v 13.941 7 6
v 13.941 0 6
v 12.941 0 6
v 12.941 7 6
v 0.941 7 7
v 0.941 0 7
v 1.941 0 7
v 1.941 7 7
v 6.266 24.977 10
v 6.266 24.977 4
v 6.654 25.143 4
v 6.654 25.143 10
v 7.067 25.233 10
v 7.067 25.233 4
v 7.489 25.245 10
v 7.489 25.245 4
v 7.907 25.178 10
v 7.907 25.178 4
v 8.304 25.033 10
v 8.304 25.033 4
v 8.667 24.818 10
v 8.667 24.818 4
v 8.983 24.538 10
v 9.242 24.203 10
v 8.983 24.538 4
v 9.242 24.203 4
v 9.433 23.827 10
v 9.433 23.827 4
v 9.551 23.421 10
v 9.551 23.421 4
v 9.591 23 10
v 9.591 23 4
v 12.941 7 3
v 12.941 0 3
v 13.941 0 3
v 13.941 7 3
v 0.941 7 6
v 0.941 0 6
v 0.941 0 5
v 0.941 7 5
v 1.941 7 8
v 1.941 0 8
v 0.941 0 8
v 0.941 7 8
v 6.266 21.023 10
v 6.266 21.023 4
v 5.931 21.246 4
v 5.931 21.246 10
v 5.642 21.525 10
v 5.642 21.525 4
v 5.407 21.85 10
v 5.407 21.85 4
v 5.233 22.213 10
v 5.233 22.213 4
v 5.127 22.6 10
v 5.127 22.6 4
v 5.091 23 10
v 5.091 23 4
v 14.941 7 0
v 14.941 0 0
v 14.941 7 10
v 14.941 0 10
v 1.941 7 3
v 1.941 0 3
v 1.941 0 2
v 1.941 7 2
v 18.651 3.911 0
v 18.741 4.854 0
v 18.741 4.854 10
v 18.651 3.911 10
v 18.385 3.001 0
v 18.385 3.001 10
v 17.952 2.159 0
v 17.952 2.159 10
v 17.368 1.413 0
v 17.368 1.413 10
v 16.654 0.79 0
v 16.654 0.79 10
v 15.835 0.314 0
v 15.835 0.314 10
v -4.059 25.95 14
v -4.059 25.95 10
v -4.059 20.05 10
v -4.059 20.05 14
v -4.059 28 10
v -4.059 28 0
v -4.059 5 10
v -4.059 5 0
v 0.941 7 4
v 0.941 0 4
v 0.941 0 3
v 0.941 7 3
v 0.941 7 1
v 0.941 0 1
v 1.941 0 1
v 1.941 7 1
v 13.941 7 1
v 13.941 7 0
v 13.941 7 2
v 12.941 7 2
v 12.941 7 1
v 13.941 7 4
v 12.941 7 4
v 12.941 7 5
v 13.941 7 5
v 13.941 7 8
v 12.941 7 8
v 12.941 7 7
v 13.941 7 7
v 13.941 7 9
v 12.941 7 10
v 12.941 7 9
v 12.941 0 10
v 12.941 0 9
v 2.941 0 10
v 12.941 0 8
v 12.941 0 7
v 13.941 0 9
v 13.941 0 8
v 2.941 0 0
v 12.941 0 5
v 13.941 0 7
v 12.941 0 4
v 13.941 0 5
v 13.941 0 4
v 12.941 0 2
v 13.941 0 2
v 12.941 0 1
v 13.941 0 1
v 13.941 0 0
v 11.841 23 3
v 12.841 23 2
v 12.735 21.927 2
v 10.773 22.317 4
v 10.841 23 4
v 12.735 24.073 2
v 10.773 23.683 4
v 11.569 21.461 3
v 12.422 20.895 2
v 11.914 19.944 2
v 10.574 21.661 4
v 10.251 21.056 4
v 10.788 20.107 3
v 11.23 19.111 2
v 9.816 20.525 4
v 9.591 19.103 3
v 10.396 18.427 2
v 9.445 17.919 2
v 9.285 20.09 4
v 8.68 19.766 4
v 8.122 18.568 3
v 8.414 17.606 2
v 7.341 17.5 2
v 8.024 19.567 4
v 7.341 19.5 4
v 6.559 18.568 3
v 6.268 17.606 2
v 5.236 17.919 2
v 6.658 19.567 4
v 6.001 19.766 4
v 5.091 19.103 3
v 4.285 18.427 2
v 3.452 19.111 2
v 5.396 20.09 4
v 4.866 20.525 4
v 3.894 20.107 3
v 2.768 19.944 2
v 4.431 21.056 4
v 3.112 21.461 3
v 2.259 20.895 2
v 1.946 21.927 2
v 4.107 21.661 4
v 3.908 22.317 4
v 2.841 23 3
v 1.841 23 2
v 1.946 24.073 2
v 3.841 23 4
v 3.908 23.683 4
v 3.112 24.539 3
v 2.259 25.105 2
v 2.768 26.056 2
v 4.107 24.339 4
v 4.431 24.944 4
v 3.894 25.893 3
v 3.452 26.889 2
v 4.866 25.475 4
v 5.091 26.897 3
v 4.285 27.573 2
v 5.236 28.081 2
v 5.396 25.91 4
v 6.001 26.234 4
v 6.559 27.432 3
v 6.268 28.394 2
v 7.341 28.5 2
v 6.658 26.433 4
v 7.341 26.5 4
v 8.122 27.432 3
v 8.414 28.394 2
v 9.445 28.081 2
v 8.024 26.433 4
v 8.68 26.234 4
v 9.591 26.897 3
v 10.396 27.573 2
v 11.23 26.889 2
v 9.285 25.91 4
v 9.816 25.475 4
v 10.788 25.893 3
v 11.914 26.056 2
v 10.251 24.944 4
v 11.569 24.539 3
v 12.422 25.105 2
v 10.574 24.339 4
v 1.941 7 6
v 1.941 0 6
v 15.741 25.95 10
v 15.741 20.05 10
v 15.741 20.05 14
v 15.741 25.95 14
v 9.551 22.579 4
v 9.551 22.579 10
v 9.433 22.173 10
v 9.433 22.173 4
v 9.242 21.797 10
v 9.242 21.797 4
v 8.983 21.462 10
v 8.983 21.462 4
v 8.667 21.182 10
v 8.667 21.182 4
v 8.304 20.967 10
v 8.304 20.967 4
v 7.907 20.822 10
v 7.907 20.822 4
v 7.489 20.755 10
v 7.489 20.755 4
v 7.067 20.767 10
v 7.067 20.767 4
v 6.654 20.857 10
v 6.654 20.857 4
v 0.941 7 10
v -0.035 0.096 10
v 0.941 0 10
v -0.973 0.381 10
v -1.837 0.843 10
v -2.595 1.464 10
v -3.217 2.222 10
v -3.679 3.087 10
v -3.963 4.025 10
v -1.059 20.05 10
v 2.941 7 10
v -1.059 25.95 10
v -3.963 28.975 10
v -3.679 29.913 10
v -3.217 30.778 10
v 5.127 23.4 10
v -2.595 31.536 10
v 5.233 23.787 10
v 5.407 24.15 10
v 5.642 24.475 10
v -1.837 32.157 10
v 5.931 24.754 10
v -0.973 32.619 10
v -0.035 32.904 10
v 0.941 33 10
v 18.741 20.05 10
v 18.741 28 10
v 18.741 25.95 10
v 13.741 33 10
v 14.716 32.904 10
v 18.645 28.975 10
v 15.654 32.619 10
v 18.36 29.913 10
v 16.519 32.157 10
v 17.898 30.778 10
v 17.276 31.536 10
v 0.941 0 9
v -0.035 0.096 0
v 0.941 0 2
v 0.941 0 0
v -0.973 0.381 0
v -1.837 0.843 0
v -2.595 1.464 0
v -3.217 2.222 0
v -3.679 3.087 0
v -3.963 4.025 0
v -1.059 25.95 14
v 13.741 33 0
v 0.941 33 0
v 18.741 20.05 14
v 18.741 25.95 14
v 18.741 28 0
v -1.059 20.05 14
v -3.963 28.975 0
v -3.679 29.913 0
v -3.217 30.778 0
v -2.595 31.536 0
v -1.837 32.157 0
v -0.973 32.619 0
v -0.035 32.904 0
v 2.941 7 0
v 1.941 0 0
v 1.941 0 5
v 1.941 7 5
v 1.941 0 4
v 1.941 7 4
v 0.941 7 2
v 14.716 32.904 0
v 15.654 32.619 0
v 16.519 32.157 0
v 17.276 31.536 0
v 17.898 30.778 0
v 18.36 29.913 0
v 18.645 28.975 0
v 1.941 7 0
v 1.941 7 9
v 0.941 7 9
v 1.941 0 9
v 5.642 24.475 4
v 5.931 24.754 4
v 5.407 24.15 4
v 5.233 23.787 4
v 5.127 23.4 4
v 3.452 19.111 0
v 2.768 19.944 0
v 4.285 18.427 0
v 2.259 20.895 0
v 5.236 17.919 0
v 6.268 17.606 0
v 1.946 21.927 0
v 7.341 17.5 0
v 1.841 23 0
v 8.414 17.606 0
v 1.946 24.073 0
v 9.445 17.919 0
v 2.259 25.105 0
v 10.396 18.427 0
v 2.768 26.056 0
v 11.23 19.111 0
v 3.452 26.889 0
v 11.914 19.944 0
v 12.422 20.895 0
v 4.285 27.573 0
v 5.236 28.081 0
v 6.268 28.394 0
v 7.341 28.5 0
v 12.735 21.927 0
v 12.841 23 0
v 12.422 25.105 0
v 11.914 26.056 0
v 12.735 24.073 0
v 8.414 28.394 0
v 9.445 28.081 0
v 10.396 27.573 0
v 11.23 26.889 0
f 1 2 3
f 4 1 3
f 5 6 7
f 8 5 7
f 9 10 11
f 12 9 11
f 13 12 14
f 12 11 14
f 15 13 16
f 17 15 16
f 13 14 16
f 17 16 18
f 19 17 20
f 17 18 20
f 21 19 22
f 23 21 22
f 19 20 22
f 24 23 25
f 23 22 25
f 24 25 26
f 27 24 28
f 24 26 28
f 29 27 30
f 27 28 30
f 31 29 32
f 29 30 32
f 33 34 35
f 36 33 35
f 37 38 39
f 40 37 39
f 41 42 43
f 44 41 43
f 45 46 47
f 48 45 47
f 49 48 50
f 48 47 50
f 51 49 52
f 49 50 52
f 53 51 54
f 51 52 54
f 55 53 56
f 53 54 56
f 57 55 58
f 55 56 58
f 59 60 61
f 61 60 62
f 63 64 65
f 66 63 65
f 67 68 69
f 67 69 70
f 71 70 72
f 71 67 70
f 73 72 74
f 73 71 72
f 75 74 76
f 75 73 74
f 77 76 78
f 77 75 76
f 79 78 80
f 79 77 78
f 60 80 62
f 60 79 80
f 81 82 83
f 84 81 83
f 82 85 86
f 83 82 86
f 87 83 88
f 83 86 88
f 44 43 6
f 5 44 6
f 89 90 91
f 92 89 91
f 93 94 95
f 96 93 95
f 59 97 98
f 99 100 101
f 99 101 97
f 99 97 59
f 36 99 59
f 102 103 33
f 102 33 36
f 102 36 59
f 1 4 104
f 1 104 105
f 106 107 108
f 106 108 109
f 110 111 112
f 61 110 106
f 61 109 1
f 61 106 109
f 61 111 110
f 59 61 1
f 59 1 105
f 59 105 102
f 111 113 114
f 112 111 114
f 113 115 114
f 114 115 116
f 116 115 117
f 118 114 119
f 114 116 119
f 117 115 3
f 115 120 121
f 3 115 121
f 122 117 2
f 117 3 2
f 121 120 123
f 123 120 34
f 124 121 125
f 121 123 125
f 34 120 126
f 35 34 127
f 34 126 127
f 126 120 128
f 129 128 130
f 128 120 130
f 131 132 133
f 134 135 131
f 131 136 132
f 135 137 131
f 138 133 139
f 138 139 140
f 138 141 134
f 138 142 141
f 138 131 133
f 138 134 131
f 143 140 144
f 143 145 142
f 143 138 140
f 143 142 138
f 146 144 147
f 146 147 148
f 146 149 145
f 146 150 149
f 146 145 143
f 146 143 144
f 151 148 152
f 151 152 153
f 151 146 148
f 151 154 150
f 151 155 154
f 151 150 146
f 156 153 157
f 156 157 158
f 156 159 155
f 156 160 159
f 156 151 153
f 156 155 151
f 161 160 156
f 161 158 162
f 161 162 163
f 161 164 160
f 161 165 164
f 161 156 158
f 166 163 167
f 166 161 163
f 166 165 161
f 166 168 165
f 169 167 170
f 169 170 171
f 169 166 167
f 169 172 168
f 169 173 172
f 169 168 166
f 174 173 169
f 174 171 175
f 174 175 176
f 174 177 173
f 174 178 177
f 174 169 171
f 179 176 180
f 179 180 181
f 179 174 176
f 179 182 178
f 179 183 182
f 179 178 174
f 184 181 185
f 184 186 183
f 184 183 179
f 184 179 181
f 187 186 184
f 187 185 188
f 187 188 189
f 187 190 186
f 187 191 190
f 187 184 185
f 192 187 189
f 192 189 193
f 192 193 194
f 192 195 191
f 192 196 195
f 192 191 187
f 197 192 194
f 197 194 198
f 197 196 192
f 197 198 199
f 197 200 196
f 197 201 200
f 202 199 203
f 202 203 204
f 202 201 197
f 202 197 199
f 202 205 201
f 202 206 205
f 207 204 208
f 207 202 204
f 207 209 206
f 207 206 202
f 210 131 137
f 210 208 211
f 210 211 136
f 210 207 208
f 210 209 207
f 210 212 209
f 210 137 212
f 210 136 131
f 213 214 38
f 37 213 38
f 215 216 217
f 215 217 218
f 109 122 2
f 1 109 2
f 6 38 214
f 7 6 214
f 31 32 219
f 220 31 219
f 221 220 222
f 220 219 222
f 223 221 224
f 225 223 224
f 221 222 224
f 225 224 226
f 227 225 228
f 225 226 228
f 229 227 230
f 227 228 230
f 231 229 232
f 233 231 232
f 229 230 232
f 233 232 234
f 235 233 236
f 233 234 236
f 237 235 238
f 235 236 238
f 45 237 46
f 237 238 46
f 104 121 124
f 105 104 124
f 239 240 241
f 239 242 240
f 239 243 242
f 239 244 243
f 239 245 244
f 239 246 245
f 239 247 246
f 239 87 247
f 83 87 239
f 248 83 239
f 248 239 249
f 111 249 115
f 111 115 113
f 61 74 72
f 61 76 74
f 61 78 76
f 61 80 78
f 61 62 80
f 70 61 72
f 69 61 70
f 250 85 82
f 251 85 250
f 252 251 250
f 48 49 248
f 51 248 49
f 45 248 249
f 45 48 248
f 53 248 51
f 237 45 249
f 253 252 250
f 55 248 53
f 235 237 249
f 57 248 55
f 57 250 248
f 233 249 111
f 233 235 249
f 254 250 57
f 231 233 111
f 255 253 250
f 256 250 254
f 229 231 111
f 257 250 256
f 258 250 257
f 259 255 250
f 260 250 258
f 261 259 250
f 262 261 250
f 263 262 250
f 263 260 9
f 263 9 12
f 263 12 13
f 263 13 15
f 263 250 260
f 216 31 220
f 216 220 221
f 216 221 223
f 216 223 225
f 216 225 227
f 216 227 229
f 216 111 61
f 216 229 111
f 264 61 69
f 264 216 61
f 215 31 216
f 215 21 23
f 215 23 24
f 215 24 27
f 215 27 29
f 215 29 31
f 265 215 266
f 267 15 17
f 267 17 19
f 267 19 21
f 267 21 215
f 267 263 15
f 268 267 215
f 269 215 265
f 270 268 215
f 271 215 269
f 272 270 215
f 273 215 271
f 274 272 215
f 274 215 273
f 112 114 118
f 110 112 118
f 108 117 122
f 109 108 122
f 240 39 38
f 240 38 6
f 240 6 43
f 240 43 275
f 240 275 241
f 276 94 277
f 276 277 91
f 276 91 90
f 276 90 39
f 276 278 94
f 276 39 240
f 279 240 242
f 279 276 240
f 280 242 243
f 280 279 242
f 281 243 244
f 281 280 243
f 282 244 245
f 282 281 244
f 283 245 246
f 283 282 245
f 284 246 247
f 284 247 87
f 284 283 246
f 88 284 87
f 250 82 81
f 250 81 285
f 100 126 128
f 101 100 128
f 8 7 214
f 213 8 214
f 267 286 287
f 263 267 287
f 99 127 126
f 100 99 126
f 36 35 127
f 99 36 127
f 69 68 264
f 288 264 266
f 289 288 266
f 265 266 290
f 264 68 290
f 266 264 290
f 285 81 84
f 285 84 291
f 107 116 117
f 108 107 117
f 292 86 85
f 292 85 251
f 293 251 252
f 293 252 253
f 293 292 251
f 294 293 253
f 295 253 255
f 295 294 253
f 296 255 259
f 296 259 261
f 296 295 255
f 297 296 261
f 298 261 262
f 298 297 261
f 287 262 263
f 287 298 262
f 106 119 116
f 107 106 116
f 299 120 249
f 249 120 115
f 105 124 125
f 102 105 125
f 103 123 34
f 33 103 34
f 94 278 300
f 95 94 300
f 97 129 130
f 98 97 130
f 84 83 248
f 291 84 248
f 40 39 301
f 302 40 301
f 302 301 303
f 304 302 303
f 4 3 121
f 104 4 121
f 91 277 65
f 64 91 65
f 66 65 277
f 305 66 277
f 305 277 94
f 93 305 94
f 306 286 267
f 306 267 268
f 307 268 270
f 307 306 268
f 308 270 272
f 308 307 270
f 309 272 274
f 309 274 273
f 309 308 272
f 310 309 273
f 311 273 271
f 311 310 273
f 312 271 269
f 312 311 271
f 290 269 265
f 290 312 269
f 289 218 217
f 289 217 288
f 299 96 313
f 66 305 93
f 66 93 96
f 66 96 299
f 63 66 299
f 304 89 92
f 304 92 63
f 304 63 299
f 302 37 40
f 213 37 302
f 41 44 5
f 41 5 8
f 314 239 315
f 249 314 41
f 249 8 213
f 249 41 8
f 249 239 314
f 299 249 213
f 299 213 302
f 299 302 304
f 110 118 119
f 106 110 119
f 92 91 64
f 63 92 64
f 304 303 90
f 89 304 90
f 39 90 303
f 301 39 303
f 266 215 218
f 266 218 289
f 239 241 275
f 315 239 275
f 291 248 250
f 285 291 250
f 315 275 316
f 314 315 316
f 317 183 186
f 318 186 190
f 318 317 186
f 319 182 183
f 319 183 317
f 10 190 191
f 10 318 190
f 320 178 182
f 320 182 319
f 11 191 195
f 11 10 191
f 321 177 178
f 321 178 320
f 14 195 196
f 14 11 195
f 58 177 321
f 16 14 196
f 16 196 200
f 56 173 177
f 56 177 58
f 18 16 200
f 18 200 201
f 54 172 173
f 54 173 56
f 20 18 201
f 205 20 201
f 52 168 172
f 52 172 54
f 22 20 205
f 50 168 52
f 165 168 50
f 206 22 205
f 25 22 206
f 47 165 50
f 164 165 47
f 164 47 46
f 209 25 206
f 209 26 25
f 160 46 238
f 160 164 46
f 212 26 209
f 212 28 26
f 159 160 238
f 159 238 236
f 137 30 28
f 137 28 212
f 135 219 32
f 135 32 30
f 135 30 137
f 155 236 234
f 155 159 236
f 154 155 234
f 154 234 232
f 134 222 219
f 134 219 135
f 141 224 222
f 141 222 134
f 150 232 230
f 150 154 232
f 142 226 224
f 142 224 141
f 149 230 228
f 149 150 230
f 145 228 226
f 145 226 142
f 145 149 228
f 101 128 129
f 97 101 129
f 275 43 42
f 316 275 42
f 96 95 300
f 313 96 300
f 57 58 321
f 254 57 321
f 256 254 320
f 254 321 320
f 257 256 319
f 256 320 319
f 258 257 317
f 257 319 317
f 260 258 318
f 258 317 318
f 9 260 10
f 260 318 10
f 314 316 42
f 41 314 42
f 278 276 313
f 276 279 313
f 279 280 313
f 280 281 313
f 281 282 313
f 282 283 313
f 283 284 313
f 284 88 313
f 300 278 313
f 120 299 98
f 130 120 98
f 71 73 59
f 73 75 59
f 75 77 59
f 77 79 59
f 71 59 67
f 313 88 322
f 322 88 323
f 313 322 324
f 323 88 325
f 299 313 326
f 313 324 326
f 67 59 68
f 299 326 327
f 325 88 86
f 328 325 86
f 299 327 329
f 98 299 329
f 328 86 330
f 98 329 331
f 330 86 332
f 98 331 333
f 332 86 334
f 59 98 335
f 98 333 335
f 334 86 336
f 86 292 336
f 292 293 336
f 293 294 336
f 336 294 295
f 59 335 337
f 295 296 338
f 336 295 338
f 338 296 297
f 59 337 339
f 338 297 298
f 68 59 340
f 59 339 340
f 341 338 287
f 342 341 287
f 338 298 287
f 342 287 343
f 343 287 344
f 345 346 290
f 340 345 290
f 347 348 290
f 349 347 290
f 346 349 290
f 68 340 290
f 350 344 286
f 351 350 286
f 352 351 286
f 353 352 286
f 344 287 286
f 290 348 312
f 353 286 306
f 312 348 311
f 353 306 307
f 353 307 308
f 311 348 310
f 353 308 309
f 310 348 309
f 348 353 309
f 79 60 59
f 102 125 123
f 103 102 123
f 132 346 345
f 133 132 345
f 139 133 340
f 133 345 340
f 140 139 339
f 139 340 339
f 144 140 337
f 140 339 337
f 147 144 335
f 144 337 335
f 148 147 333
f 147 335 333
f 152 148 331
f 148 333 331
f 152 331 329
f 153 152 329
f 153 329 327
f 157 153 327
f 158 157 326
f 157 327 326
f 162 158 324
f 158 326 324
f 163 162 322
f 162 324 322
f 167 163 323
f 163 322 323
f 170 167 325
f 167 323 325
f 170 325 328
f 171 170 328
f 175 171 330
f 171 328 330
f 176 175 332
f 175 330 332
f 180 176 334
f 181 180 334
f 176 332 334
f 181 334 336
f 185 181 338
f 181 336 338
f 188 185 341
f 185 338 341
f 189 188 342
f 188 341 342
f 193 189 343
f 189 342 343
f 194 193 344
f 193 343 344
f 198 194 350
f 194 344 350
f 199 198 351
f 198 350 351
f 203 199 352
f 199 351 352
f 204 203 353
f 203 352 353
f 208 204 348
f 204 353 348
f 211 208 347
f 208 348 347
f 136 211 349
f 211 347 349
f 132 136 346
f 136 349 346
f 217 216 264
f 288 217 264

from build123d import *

# Parameters (mm, degrees)
F0_W        = 18.5
F0_H        = 13
F0_W_2      = 4.3
F0_W_3      = 3
F0_H_2      = 2.95
F1_DEPTH    = 10
F3_DEPTH    = 7
F4_T1_DEPTH = 35
F4_T3_DEPTH = 34.269322199
F0_H_3      = 5.9
F5_DEPTH    = 14
F6_R        = 5.5
F7_DEPTH    = 4
F8_SIZE     = 2


# Not quite as in the source:
# - a fillet or chamfer that OpenCascade refuses, or shapes differently, is made with other operations: its cross-section is extruded or revolved along the edge and cut away or added


with BuildPart() as f1:
    # F0 (on Top) → F1 (new body)
    with BuildSketch(Plane.XY):
        with Locations((5.190736489, 6.5)):
            Rectangle(F0_W, F0_H)
        with Locations((16.590736489, 6.5)):
            Rectangle(F0_W_2, F0_H)
        Polygon((14.440736489, 20.05), (14.440736489, 13), (18.740736489, 13), (18.740736489, 20.05), (15.740736489, 20.05), (15.740736489, 25.95), (18.740736489, 25.95), (18.740736489, 33), (14.440736489, 33), (14.440736489, 25.95), (14.440736489, 23), align=None)
        with BuildLine():
            Line((-4.059263511, 20.05), (-4.059263511, 13))
            Line((-4.059263511, 13), (14.440736489, 13))
            Line((14.440736489, 13), (14.440736489, 20.05))
            Line((14.440736489, 20.05), (11.440736489, 20.05))
            Line((11.440736489, 20.05), (11.440736489, 23))
            Line((11.440736489, 23), (9.590736489, 23))
            ThreePointArc((9.590736489, 23), (8.4904647177, 21.0659304563), (6.265736489, 21.0234183548))
            ThreePointArc((6.265736489, 21.0234183548), (4.0410082602, 21.0659304563), (2.940736489, 23))
            Line((2.940736489, 23), (-1.059263511, 23))
            Line((-1.059263511, 23), (-1.059263511, 20.05))
            Line((-1.059263511, 20.05), (-4.059263511, 20.05))
        make_face()
        with Locations((12.940736489, 21.525)):
            Rectangle(F0_W_3, F0_H_2)
        with Locations((12.940736489, 24.475)):
            Rectangle(F0_W_3, F0_H_2)
        with BuildLine():
            Line((-4.059263511, 33), (-4.059263511, 25.95))
            Line((-4.059263511, 25.95), (-1.059263511, 25.95))
            Line((-1.059263511, 25.95), (-1.059263511, 23))
            Line((-1.059263511, 23), (2.940736489, 23))
            ThreePointArc((2.940736489, 23), (4.0410082602, 24.9340695437), (6.265736489, 24.9765816452))
            ThreePointArc((6.265736489, 24.9765816452), (8.4904647177, 24.9340695437), (9.590736489, 23))
            Line((9.590736489, 23), (11.440736489, 23))
            Line((11.440736489, 23), (11.440736489, 25.95))
            Line((11.440736489, 25.95), (14.440736489, 25.95))
            Line((14.440736489, 25.95), (14.440736489, 33))
            Line((14.440736489, 33), (-4.059263511, 33))
        make_face()
        with BuildLine():
            Line((5.090736489, 23), (2.940736489, 23))
            ThreePointArc((2.940736489, 23), (4.0410082602, 21.0659304563), (6.265736489, 21.0234183548))
            ThreePointArc((6.265736489, 21.0234183548), (5.4066669452, 21.8502717712), (5.090736489, 23))
        make_face()
        with BuildLine():
            ThreePointArc((6.265736489, 24.9765816452), (4.0410082602, 24.9340695437), (2.940736489, 23))
            Line((2.940736489, 23), (5.090736489, 23))
            ThreePointArc((5.090736489, 23), (5.4066669452, 24.1497282288), (6.265736489, 24.9765816452))
        make_face()
    extrude(amount=F1_DEPTH)

    # F2 (on face) → F3 (cut)
    with BuildSketch(Plane.XZ):
        Polygon((2.940736489, 10), (0.940736489, 10), (0.940736489, 9), (1.940736489, 9), (1.940736489, 8), (0.940736489, 8), (0.940736489, 7), (1.940736489, 7), (1.940736489, 6), (0.940736489, 6), (0.940736489, 5), (1.940736489, 5), (1.940736489, 4), (0.940736489, 4), (0.940736489, 3), (1.940736489, 3), (1.940736489, 2), (0.940736489, 2), (0.940736489, 1), (1.940736489, 1), (1.940736489, 0), (2.940736489, 0), align=None)
        Polygon((14.940736489, 10), (12.940736489, 10), (12.940736489, 9), (13.940736489, 9), (13.940736489, 8), (12.940736489, 8), (12.940736489, 7), (13.940736489, 7), (13.940736489, 6), (12.940736489, 6), (12.940736489, 5), (13.940736489, 5), (13.940736489, 4), (12.940736489, 4), (12.940736489, 3), (13.940736489, 3), (13.940736489, 2), (12.940736489, 2), (12.940736489, 1), (13.940736489, 1), (13.940736489, 0), (14.940736489, 0), align=None)
    extrude(amount=-F3_DEPTH, mode=Mode.SUBTRACT)

    # F4: fillet of radius 5 on 4 edges, made by hand

    # F4_s2 → F4_t1 (cut)
    with BuildSketch(Plane.XY.offset(-12.5)):
        with BuildLine():
            ThreePointArc((-4.059263511, 28), (-2.594797417, 31.5355339059), (0.940736489, 33))
            Line((0.940736489, 33), (-4.059263511, 33))
            Line((-4.059263511, 33), (-4.059263511, 28))
        make_face()
        with BuildLine():
            ThreePointArc((0.940736489, 0), (-2.594797417, 1.4644660941), (-4.059263511, 5))
            Line((-4.059263511, 5), (-4.059263511, 0))
            Line((-4.059263511, 0), (0.940736489, 0))
        make_face()
        with BuildLine():
            ThreePointArc((13.740736489, 33), (17.2762703949, 31.5355339059), (18.740736489, 28))
            Line((18.740736489, 28), (18.740736489, 33))
            Line((18.740736489, 33), (13.740736489, 33))
        make_face()
    extrude(amount=F4_T1_DEPTH, mode=Mode.SUBTRACT)

    # F4_s4 → F4_t3 (cut)
    with BuildSketch(Plane.XY.offset(-12.1346610995)):
        with BuildLine():
            ThreePointArc((18.740736489, 4.8538644398), (17.677740426, 1.7716574383), (14.940736489, 0))
            Line((14.940736489, 0), (18.740736489, 0))
            Line((18.740736489, 0), (18.740736489, 4.8538644398))
        make_face()
    extrude(amount=F4_T3_DEPTH, mode=Mode.SUBTRACT)

    # F0 (on Top) → F5 (join)
    with BuildSketch(Plane.XY):
        with Locations((-2.559263511, 24.475)):
            Rectangle(F0_W_3, F0_H_2)
        with Locations((-2.559263511, 21.525)):
            Rectangle(F0_W_3, F0_H_2)
        with Locations((17.240736489, 23)):
            Rectangle(F0_W_3, F0_H_3)
    extrude(amount=F5_DEPTH)

    # F6 (on face) → F7 (cut)
    with BuildSketch(Plane(origin=(0, 0, 0), x_dir=(1, 0, 0), z_dir=(0, 0, -1))):
        with Locations((7.340736489, -23)):
            Circle(F6_R)
    extrude(amount=-F7_DEPTH, mode=Mode.SUBTRACT)

    # F8
    f8_edges = [f1.edges().sort_by_distance(p)[0] for p in [
        (1.840736, 23, 4),
    ]]
    chamfer(f8_edges, length=F8_SIZE)


solid = f1.part
